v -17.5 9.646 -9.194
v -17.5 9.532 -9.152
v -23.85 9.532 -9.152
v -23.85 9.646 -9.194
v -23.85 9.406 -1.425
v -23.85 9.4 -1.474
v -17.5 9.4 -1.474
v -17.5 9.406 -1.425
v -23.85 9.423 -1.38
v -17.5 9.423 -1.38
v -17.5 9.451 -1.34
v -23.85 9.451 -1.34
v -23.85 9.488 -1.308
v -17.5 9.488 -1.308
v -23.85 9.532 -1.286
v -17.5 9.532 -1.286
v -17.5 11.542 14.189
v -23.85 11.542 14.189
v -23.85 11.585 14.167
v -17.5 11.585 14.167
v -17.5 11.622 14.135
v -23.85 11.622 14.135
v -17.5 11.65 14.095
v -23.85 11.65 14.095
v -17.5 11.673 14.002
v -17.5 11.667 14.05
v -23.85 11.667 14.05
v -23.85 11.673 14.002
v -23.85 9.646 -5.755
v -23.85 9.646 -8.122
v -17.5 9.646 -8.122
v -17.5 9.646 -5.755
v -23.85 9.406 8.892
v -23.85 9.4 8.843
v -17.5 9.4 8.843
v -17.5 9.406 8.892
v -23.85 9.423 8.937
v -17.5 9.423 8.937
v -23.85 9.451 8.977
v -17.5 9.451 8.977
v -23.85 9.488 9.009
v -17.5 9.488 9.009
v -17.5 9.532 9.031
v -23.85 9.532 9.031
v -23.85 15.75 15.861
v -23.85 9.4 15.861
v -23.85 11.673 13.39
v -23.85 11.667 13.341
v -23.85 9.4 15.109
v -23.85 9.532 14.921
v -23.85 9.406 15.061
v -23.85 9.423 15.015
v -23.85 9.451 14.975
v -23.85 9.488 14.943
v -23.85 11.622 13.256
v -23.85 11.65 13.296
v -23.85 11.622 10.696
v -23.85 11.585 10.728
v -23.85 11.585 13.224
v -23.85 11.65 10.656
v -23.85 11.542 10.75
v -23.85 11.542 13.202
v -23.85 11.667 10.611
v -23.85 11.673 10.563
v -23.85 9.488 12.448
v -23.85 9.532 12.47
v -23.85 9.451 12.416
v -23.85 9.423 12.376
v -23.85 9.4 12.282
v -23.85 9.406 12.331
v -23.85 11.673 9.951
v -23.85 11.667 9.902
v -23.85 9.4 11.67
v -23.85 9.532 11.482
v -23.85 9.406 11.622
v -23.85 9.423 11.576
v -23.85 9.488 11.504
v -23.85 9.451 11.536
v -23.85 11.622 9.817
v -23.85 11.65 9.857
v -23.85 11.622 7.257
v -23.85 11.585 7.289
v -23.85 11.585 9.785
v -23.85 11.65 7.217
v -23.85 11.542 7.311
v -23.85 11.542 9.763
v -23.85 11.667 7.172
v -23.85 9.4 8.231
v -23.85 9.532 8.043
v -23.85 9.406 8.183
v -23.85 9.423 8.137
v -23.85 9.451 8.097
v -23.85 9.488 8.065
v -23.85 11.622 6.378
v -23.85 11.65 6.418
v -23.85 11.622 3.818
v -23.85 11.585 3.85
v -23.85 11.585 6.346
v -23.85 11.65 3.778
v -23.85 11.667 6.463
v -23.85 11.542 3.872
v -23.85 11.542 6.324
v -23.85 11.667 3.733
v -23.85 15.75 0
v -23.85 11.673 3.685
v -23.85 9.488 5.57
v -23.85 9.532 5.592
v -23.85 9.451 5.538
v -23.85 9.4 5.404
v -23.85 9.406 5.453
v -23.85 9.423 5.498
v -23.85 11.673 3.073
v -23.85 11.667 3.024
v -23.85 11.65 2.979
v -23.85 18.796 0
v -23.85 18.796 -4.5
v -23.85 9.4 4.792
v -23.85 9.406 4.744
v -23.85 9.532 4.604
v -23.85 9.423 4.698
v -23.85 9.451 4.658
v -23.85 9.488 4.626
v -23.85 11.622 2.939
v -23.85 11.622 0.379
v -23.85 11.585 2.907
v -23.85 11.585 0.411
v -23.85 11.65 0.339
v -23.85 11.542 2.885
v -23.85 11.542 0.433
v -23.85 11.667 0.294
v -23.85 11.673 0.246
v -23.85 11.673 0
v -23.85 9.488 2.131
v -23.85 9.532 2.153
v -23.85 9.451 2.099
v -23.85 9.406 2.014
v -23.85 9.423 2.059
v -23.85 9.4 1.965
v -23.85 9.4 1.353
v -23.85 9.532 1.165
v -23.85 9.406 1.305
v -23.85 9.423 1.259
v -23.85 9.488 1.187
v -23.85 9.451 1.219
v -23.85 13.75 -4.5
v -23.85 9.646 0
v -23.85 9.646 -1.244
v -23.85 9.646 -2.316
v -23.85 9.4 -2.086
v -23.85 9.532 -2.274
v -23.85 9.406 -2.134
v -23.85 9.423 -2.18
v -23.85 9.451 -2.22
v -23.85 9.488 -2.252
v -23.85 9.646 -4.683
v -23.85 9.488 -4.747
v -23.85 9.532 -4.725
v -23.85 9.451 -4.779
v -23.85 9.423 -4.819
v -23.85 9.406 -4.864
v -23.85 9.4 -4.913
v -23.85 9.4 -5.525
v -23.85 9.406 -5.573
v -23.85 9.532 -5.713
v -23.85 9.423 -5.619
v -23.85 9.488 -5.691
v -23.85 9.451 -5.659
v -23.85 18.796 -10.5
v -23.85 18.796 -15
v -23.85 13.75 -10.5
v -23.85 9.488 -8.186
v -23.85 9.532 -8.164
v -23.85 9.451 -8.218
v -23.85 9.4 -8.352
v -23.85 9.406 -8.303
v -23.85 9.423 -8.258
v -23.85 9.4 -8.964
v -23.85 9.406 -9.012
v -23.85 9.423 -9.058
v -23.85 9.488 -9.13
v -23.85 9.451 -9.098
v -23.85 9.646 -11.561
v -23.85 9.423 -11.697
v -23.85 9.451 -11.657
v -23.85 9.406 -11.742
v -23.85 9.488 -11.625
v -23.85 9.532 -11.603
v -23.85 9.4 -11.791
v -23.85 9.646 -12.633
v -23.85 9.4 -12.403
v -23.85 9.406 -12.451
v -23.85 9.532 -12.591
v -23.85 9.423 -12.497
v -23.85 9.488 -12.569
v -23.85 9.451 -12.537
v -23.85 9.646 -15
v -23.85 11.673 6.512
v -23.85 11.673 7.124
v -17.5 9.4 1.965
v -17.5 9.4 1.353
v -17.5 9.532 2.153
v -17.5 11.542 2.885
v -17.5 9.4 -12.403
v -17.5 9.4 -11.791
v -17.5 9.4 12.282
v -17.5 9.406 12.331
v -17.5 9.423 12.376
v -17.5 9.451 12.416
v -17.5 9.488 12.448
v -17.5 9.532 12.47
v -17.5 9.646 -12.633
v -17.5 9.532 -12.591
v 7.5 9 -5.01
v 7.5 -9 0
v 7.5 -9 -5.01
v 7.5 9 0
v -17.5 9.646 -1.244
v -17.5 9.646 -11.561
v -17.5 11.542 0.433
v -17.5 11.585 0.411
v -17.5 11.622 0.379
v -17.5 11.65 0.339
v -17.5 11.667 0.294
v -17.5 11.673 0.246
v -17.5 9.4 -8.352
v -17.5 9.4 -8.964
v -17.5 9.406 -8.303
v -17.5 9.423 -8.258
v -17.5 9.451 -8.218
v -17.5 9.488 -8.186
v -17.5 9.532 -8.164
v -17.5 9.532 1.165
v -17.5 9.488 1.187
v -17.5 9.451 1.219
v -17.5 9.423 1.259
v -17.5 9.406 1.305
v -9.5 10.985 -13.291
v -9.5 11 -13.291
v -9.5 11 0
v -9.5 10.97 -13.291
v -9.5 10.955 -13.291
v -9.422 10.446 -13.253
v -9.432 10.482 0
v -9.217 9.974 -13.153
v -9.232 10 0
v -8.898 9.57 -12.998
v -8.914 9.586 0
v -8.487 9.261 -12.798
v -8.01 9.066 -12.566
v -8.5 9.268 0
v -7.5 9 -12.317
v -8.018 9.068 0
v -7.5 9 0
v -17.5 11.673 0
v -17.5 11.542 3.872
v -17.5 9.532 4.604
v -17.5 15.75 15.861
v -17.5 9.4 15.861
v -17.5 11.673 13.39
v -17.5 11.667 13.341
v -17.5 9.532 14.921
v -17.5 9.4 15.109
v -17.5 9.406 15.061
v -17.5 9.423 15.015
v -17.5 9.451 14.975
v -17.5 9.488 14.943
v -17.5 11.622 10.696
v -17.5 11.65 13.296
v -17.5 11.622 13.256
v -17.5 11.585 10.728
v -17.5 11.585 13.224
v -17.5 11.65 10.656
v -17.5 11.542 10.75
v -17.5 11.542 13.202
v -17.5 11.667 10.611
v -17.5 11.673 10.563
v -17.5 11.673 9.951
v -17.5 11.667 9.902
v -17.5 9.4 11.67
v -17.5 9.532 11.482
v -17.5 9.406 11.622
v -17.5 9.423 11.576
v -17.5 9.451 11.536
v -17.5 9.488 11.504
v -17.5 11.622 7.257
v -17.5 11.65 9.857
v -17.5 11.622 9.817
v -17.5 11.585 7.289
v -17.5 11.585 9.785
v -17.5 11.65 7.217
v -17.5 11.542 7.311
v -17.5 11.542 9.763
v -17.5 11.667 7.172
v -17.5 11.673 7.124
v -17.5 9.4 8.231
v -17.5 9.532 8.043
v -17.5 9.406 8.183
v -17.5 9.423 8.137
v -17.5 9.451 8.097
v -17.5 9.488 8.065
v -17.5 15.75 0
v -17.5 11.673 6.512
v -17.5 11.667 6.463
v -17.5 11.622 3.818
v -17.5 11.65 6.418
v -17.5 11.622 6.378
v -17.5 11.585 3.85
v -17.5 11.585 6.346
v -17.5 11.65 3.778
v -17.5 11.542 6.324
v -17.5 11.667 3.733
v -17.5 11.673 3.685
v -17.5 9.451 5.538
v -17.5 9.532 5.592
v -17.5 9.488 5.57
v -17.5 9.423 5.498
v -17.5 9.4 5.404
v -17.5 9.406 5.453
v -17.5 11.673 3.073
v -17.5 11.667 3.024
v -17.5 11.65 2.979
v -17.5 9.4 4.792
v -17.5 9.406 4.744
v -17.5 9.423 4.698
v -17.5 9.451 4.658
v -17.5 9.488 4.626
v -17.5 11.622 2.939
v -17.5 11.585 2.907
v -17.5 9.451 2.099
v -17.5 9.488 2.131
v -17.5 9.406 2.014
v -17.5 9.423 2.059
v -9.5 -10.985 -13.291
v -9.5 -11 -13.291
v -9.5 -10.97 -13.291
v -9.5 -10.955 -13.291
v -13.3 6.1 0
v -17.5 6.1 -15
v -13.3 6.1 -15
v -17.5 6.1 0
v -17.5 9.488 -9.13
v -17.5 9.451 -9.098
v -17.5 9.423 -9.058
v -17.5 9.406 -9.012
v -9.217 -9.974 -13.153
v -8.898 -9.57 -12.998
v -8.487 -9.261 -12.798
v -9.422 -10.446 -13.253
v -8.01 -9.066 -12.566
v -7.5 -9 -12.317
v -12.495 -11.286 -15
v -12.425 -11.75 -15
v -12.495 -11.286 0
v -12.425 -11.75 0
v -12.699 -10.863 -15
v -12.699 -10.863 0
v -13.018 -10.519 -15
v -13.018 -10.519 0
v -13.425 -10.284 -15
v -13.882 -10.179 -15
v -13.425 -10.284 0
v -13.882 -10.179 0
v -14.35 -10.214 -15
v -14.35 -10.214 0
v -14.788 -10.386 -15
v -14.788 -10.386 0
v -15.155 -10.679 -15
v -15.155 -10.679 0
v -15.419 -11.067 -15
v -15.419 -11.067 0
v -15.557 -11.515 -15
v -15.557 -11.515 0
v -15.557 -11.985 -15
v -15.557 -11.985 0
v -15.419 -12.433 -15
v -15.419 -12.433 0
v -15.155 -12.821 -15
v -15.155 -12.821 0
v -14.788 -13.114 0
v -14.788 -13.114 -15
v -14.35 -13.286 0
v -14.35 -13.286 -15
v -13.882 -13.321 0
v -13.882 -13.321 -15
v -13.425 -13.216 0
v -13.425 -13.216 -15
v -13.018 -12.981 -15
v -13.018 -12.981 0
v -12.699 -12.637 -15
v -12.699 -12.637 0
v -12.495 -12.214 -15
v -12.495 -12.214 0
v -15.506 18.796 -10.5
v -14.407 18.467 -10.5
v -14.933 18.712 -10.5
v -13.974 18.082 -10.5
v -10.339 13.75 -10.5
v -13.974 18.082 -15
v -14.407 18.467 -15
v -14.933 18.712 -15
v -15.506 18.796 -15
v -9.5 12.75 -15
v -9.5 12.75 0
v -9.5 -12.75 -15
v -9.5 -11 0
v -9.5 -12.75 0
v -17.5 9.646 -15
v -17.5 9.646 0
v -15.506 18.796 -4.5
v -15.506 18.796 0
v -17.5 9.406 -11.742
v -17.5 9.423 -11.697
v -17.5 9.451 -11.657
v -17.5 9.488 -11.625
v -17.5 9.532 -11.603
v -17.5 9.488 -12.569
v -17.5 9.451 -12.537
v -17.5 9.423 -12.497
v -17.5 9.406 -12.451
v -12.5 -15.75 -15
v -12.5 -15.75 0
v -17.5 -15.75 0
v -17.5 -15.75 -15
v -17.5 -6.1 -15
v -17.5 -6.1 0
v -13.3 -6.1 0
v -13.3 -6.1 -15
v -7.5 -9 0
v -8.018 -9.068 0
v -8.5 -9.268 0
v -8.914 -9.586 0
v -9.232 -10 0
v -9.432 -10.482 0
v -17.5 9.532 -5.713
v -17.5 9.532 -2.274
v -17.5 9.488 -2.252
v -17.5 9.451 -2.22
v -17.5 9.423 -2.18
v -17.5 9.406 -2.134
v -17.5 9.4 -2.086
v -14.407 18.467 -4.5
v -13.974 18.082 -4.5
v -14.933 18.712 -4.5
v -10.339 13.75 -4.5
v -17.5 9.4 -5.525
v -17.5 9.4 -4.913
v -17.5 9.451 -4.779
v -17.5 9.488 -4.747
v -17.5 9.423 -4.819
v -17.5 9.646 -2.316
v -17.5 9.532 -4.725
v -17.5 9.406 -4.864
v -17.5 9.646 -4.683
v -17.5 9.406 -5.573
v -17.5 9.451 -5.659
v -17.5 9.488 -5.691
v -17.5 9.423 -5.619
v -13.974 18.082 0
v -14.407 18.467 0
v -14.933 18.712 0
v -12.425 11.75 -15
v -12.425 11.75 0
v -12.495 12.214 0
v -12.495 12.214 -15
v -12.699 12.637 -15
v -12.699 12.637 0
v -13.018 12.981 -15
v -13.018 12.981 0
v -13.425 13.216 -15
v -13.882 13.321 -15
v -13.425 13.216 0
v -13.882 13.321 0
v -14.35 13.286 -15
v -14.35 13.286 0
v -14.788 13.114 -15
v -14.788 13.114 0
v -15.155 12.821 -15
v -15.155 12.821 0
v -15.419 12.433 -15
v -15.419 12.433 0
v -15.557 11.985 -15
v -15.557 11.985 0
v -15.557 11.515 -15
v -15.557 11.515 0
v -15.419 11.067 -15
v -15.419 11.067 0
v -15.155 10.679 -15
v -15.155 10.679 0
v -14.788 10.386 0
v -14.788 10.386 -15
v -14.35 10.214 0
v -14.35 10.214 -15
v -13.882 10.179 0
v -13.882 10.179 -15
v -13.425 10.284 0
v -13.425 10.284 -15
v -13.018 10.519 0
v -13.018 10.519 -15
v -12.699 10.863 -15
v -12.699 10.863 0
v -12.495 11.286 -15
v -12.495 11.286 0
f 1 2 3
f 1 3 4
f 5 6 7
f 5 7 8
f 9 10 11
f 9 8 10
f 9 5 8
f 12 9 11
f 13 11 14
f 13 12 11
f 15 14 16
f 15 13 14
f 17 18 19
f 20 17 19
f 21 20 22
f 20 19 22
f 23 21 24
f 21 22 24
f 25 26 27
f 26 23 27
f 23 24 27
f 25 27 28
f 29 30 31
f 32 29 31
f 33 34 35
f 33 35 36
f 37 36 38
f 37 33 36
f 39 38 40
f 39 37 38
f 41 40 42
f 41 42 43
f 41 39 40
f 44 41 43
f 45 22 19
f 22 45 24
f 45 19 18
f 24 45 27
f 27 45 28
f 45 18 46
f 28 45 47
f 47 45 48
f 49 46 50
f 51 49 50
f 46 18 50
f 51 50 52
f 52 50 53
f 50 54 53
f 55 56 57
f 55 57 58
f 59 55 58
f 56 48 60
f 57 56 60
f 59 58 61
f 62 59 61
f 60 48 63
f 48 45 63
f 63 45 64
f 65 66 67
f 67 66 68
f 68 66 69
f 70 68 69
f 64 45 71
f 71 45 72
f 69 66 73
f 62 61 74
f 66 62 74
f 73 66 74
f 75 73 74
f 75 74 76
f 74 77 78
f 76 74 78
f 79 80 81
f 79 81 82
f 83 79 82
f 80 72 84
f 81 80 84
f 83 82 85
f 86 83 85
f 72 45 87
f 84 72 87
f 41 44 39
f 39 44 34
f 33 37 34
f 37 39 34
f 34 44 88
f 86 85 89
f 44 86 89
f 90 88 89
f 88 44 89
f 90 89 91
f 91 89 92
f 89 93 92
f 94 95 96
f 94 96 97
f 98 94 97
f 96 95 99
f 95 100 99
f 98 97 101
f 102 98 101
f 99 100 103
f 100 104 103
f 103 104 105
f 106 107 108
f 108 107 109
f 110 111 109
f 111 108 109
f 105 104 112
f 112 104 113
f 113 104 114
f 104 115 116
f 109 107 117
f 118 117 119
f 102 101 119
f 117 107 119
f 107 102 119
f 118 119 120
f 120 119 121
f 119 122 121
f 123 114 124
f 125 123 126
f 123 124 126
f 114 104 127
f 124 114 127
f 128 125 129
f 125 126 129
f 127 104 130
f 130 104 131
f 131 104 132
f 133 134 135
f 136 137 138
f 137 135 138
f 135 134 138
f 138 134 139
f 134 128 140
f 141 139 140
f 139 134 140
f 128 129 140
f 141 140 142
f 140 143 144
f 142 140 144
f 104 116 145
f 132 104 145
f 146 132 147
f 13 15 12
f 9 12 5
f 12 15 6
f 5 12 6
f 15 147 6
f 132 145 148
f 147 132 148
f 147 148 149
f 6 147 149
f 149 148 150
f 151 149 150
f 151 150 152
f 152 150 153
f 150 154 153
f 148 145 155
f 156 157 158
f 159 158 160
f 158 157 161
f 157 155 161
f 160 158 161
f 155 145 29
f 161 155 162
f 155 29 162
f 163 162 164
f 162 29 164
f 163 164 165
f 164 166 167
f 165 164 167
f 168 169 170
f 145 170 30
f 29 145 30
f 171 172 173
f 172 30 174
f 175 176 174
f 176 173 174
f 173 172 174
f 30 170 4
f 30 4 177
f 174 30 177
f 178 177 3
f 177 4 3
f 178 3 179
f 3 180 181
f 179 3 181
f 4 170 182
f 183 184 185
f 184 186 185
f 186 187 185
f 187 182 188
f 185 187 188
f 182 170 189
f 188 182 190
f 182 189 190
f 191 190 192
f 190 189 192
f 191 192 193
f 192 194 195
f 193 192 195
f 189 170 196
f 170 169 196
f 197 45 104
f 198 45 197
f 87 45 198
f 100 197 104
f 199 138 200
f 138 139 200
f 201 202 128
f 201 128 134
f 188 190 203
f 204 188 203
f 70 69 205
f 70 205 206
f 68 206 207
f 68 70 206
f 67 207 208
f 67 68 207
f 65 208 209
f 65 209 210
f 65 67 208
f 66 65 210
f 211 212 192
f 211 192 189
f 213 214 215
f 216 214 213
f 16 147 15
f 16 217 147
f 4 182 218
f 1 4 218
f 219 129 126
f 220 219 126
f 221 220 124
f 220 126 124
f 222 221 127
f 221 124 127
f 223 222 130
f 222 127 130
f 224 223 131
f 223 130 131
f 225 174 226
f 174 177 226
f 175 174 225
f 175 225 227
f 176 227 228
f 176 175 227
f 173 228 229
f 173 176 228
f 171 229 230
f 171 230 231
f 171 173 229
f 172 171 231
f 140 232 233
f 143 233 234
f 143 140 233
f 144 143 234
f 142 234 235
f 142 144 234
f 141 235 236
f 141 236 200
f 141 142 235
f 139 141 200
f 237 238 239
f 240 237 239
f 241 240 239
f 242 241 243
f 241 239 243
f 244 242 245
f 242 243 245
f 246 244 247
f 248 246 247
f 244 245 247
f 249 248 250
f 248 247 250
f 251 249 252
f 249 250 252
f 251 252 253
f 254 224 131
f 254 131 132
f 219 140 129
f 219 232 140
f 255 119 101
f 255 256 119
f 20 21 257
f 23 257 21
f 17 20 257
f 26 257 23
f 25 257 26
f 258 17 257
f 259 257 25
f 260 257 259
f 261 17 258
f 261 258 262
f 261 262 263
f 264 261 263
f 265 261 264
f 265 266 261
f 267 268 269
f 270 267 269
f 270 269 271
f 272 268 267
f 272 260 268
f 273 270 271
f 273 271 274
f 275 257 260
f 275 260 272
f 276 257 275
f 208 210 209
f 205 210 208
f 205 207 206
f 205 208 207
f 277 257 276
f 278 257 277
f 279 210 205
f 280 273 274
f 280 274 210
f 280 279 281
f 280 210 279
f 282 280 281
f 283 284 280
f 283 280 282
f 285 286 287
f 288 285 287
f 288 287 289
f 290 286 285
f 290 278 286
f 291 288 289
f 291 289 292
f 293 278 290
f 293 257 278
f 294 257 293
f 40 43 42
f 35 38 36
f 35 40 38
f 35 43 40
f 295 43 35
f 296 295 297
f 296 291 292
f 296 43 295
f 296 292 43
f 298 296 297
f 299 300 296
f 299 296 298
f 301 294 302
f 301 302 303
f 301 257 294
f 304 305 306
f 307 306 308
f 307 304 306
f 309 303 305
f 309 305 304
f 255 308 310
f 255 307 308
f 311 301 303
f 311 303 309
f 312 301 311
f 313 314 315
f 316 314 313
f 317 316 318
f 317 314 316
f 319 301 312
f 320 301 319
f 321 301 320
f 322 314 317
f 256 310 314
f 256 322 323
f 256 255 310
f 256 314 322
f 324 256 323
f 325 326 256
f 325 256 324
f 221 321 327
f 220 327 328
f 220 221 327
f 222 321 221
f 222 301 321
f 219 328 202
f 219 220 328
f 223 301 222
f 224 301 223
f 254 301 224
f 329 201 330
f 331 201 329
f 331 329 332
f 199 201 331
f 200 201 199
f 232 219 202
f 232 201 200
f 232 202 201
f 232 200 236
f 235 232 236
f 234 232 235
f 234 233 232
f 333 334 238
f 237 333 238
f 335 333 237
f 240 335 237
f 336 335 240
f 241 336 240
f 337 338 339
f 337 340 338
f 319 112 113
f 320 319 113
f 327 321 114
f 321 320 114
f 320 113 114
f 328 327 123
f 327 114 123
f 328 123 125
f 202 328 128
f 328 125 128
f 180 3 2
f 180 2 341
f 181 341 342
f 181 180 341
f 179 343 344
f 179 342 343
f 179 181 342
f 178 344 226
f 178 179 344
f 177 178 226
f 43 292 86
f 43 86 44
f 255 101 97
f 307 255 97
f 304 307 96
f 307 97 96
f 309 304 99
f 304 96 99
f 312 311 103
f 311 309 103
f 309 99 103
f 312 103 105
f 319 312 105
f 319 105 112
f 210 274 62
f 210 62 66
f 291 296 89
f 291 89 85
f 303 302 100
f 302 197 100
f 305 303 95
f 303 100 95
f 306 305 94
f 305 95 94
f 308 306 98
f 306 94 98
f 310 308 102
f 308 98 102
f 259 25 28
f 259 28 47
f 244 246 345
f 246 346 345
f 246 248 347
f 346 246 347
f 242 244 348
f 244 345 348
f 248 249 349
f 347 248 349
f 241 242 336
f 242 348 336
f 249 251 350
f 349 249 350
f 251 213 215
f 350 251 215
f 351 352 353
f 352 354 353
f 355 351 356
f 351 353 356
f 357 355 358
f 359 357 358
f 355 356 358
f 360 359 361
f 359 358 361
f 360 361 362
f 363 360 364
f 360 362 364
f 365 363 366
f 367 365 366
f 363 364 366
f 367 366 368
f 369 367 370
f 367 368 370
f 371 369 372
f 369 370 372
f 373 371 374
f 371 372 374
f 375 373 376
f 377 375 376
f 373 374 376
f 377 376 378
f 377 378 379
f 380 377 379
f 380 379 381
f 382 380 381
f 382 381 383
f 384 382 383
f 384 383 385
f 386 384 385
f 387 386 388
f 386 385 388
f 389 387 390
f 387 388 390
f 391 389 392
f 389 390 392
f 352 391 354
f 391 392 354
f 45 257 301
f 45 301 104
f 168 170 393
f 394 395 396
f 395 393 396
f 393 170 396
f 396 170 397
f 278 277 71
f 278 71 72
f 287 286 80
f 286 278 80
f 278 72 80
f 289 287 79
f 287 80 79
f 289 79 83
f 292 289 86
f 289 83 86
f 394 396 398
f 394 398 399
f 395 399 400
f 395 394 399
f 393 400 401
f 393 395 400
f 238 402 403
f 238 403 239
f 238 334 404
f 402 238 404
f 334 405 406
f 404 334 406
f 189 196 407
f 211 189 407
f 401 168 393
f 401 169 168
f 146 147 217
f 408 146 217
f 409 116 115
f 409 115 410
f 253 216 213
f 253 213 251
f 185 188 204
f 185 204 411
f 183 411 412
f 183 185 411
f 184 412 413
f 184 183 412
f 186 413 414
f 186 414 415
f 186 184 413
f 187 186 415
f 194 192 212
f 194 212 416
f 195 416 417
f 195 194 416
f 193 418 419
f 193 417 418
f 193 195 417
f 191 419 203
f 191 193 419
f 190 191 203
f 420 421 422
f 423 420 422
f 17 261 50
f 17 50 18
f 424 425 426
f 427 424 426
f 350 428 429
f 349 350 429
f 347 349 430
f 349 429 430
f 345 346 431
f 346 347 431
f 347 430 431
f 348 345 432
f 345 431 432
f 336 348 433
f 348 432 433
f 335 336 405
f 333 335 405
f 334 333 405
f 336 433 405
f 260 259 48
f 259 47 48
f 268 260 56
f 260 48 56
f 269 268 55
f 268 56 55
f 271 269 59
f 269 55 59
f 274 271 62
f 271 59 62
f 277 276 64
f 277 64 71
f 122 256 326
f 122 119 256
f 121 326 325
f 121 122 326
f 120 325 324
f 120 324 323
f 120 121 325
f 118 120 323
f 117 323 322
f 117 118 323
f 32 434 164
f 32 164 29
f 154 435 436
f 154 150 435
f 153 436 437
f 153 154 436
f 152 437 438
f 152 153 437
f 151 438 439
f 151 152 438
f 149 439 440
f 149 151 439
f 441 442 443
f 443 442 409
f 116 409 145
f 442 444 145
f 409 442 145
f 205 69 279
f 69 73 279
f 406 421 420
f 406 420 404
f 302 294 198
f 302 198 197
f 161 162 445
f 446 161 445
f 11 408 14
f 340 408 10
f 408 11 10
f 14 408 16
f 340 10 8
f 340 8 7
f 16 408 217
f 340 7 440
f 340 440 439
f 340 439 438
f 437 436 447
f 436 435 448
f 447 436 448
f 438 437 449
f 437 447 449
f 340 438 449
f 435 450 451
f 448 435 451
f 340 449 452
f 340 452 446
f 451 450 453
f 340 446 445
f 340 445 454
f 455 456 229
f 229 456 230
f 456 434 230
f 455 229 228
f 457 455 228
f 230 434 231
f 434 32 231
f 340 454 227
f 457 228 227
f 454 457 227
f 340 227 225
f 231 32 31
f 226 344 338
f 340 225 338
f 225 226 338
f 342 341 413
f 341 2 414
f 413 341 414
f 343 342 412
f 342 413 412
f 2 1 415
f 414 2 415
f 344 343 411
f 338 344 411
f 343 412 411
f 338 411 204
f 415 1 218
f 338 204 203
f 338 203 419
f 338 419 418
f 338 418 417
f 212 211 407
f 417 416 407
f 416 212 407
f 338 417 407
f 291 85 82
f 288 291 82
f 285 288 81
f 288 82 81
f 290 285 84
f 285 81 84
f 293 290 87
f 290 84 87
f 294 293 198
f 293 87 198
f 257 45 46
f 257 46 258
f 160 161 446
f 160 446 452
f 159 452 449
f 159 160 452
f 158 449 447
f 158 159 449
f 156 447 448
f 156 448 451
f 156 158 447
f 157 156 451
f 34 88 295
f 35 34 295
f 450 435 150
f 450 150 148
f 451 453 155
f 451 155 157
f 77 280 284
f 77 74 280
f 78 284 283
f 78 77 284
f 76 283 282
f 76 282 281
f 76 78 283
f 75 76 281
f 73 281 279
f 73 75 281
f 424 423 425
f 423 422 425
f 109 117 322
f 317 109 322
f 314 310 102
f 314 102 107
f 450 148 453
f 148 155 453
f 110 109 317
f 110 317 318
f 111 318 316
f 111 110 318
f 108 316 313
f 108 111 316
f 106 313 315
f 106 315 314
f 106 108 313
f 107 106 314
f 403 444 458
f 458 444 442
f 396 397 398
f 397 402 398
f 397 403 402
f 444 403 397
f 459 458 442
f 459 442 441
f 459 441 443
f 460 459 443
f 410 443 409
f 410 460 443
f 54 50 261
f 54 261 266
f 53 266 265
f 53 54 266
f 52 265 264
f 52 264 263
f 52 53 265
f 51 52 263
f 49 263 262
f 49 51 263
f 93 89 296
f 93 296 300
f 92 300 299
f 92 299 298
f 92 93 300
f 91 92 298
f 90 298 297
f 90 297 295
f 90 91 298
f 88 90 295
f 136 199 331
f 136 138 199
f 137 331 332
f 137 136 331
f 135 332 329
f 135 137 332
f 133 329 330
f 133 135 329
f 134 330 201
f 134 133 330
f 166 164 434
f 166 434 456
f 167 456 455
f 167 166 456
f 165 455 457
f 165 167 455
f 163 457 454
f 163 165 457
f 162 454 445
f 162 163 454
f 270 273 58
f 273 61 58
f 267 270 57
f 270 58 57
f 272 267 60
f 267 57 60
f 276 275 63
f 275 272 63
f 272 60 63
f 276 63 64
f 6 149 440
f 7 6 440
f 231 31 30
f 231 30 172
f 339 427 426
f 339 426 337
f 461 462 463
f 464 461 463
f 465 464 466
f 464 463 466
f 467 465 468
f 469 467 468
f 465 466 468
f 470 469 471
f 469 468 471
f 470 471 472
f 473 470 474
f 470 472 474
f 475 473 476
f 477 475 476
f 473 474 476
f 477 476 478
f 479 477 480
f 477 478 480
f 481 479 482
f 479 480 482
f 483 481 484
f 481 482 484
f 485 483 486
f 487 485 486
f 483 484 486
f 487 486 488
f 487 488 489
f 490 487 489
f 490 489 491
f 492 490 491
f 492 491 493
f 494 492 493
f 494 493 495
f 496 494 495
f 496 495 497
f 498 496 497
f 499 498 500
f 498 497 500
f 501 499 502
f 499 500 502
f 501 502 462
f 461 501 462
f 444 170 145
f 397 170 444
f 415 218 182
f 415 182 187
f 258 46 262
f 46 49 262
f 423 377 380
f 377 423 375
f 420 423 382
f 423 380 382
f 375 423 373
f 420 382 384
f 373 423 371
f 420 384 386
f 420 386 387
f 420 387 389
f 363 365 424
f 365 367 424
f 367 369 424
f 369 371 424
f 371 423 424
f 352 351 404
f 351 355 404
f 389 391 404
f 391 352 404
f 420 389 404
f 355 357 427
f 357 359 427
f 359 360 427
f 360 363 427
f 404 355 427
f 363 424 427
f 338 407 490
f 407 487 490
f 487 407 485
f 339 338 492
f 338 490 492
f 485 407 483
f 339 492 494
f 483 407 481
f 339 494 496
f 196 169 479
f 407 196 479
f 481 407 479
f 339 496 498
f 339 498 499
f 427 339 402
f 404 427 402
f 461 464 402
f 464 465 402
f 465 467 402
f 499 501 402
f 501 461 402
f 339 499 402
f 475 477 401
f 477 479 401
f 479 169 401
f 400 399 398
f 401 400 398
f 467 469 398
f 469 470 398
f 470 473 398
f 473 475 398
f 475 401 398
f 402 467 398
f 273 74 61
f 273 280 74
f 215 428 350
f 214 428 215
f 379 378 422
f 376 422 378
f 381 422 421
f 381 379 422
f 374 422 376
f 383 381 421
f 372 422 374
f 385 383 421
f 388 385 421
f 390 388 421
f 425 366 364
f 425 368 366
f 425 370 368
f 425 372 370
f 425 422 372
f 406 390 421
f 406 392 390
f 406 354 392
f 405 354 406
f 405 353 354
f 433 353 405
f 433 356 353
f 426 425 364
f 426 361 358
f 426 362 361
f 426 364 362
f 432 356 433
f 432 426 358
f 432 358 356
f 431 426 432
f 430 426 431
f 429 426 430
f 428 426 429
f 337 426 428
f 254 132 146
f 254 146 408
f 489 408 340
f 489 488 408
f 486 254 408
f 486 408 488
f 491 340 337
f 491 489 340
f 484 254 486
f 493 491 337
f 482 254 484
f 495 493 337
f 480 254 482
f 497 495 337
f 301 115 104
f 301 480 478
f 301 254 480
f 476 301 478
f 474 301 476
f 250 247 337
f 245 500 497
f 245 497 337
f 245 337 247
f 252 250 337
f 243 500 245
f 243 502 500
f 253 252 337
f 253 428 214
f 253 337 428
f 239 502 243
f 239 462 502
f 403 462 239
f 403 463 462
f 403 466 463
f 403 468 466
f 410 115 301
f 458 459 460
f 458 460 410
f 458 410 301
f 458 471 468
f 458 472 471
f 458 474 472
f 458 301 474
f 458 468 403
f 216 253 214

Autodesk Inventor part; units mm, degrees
ref_plane "YZ Plane" through (0, 0, 0) normal (1, 0, 0) x (0, 1, 0)
ref_plane "XZ Plane" through (0, 0, 0) normal (0, 1, 0) x (-1, 0, 0)
sketch "Sketch1" plane through (0, 0, 0) normal (0, 0, 1) x (1, 0, 0)
  line L0 (-7.5, -9) -> (7.5, -9)
  line L1 (7.5, -9) -> (7.5, 9)
  line L2 (7.5, 9) -> (-7.5, 9)
  line L3 (-9.5, -11) -> (-9.5, -12.75)
  line L4 (-12.5, -15.75) -> (-17.5, -15.75)
  arc A0 (-7.5, -9) -> (-9.5, -11) centre (-7.5, -11) ccw
  line L5 (-12.5, -15.75) -> (-9.5, -12.75)
  line L6 (-17.5, -15.75) -> (-17.5, -6.1)
  line L7 (-17.5, -6.1) -> (-13.3, -6.1)
  line L8 (-13.3, -6.1) -> (-13.3, 0)
  line L9 (2.7531, 0) -> (-2.7531, 0) construction
  line L10 (-9.5, 11) -> (-9.5, 12.75)
  line L11 (-12.5, 15.75) -> (-17.5, 15.75)
  arc A1 (-9.5, 11) -> (-7.5, 9) centre (-7.5, 11) ccw
  line L12 (-12.5, 15.75) -> (-9.5, 12.75)
  line L13 (-17.5, 15.75) -> (-17.5, 6.1)
  line L14 (-17.5, 6.1) -> (-13.3, 6.1)
  line L15 (-13.3, 6.1) -> (-13.3, 0)
  circle A2 centre (-14, -11.75) radius 1.575
  circle A3 centre (-14, 11.75) radius 1.575
  line L16 (-17.5, 15.75) -> (-23.85, 15.75)
  line L17 (-23.85, 15.75) -> (-23.85, 9.4)
  line L18 (-23.85, 9.4) -> (-17.5, 9.4)
  line L19 (-9.5, 11.875) -> (-9.5, -11.875)
  point P0 (0, 0)
  point P1 (0, 0)
  point P2 (7.5, 0)
  point P3 (0, -9)
  point P4 (-9.5, -15.75)
  point P5 (0, 0)
  point P6 (-9.5, 15.75)
  dimension "d1" = 18
  dimension "d3" = 8
  dimension "d4" = 2
  dimension "d5" = 3
  dimension "d6" = 3
  dimension "d7" = 9.65
  dimension "d8" = 4.2
  dimension "d9" = 6.1
  dimension "d10" = 7.5
  dimension "d11" = 3.875
  dimension "d12" = 3.15
  dimension "d13" = 3.5
  dimension "d14" = 4
  dimension "d15" = 6.35
  dimension "d16" = 6.35
extrude "Extrusion1" add sketch "Sketch1" against normal blind 15 contours L3 L5 L4 L6 L7 L8 L15 L14 L13 L11 L12 L10 L19
extrude "Extrusion2" add sketch "Sketch1" against normal blind 13.291 contours A0 L19 A1 L2 L1 L0
chamfer "Chamfer1" distance 17 distance2 8.281 1 edges at (7.5, 0, -13.291) measured on face at (-2.5, 3, -13.291)
extrude "Extrusion3" add sketch "Sketch1" along normal blind 15.861 and the other way blind 15 contours L13 L18 L17 L16
ref_plane "Work Plane1" through (-17.5, 9.4, 0) normal (1, 0, 0) x (0, 0, -1)
sketch "Sketch2" plane through (-17.5, 9.4, 0) normal (1, 0, 0) x (0, 0, -1)
  line L0 (0, 6.35) -> (0, 0) projected
  line L1 (15, 0) -> (0, 0) projected
  line L2 (15, 6.35) -> (15, 0) projected
  line L3 (0, 6.35) -> (15, 6.35) projected
  line L4 (-15.861, 6.35) -> (0, 6.35) projected
  line L5 (-15.861, 0) -> (-15.861, 6.35) projected
  line L6 (0, 0) -> (-15.861, 0) projected
  line L7 (0, -3.3) -> (0, 0) projected
  line L8 (15, -3.3) -> (0, -3.3) projected
  line L9 (15, 0) -> (15, -3.3) projected
  line L10 (0, -15.5) -> (15, -15.5) projected
  line L11 (15, -15.5) -> (15, -25.15) projected
  line L12 (15, -25.15) -> (0, -25.15) projected
  line L13 (0, -25.15) -> (0, -15.5) projected
  line L14 (-15.861, 0) -> (-14.969, 0)
  line L15 (-14.969, 0) -> (-14.1416, 2.2732)
  line L16 (-14.1416, 2.2732) -> (-13.2496, 2.2732)
  line L17 (-13.2496, 2.2732) -> (-12.4223, 0)
  line L18 (-15.861, 0) -> (15, 0) projected
  line L19 (-9.8106, 2.2732) -> (-8.9833, 0)
  line L20 (-10.7026, 2.2732) -> (-9.8106, 2.2732)
  line L21 (-11.53, 0) -> (-10.7026, 2.2732)
  line L22 (-12.422, 0) -> (-11.53, 0)
  line L23 (-6.3716, 2.2732) -> (-5.5443, 0)
  line L24 (-7.2636, 2.2732) -> (-6.3716, 2.2732)
  line L25 (-8.091, 0) -> (-7.2636, 2.2732)
  line L26 (-8.983, 0) -> (-8.091, 0)
  line L27 (-2.9326, 2.2732) -> (-2.1053, 0)
  line L28 (-3.8246, 2.2732) -> (-2.9326, 2.2732)
  line L29 (-4.652, 0) -> (-3.8246, 2.2732)
  line L30 (-5.544, 0) -> (-4.652, 0)
  line L31 (0.5064, 2.2732) -> (1.3337, 0)
  line L32 (-0.3856, 2.2732) -> (0.5064, 2.2732)
  line L33 (-1.213, 0) -> (-0.3856, 2.2732)
  line L34 (-2.105, 0) -> (-1.213, 0)
  line L35 (3.9454, 2.2732) -> (4.7727, 0)
  line L36 (3.0534, 2.2732) -> (3.9454, 2.2732)
  line L37 (2.226, 0) -> (3.0534, 2.2732)
  line L38 (1.334, 0) -> (2.226, 0)
  line L39 (7.3844, 2.2732) -> (8.2117, 0)
  line L40 (6.4924, 2.2732) -> (7.3844, 2.2732)
  line L41 (5.665, 0) -> (6.4924, 2.2732)
  line L42 (4.773, 0) -> (5.665, 0)
  line L43 (10.8234, 2.2732) -> (11.6507, 0)
  line L44 (9.9314, 2.2732) -> (10.8234, 2.2732)
  line L45 (9.104, 0) -> (9.9314, 2.2732)
  line L46 (8.212, 0) -> (9.104, 0)
  line L47 (14.2624, 2.2732) -> (15.0897, 0)
  line L48 (13.3704, 2.2732) -> (14.2624, 2.2732)
  line L49 (12.543, 0) -> (13.3704, 2.2732)
  line L50 (11.651, 0) -> (12.543, 0)
  point P0 (0, -9.4)
  point P1 (15, 0.2465)
  point P2 (11.6507, 0)
  point P3 (8.2117, 0)
  point P4 (4.7727, 0)
  point P5 (1.3337, 0)
  point P6 (-2.1053, 0)
  point P7 (-5.5443, 0)
  point P8 (-8.9833, 0)
  point P9 (-12.4223, 0)
  dimension "d29" = 0.892
  dimension "d30" = 110
  dimension "d31" = 110
  dimension "d32" = 0.892
  dimension "d33" = 2.2732
  dimension "d36" = 3.439
extrude "Extrusion4" cut sketch "Sketch2" against normal up to surface (6.35 mm away) contours L32 L31 L1 L0 | L0 L6 L33 L32 | L2 L1 L49 L48 L47 | L15 L16 L17 L6 | L37 L36 L35 L1 | L6 L29 L28 L27 | L1 L45 L44 L43 | L21 L20 L19 L6 | L41 L40 L39 L1 | L6 L25 L24 L23
fillet "Fillet1" radius 0.2 35 edges at (-20.675, 11.6732, 14.1416) (-20.675, 11.6732, 13.2496) (-20.675, 9.4, 14.969) (-20.675, 9.4, 12.4223) (-20.675, 9.4, 11.53) (-20.675, 11.6732, 10.7026) (-20.675, 11.6732, 9.8106) (-20.675, 9.4, 8.9833) (-20.675, 9.4, 8.091) (-20.675, 11.6732, 7.2636) (-20.675, 11.6732, 6.3716) (-20.675, 9.4, 5.5443) (-20.675, 9.4, 4.652) (-20.675, 11.6732, 3.8246) (-20.675, 11.6732, 2.9326) (-20.675, 9.4, 2.1053) (-20.675, 9.4, 1.213) (-20.675, 11.6732, 0.3856) (-20.675, 11.6732, -0.5064) (-20.675, 9.4, -1.3337) (-20.675, 9.4, -2.226) (-20.675, 11.6732, -3.0534) (-20.675, 11.6732, -3.9454) (-20.675, 9.4, -4.7727) (-20.675, 9.4, -5.665) (-20.675, 11.6732, -6.4924) (-20.675, 11.6732, -7.3844) (-20.675, 9.4, -8.2117) (-20.675, 9.4, -9.104) (-20.675, 11.6732, -9.9314) (-20.675, 11.6732, -10.8234) (-20.675, 9.4, -11.6507) (-20.675, 9.4, -12.543) (-20.675, 11.6732, -13.3704) (-20.675, 11.6732, -14.2624)
sketch "Sketch3" plane through (0, 0, -15) normal (0, 0, -1) x (-1, 0, 0)
  line L0 (23.85, 9.6465) -> (17.5, 9.6465) projected
  line L1 (17.5, 9.6465) -> (17.5, 6.1) projected
  line L2 (17.5, 6.1) -> (13.3, 6.1) projected
  line L3 (13.3, 6.1) -> (13.3, -6.1) projected
  line L4 (13.3, -6.1) -> (17.5, -6.1) projected
  line L5 (17.5, -6.1) -> (17.5, -15.75) projected
  line L6 (17.5, -15.75) -> (12.5, -15.75) projected
  line L7 (12.5, -15.75) -> (9.5, -12.75) projected
  line L8 (9.5, -12.75) -> (9.5, 12.75) projected
  line L9 (9.5, 12.75) -> (12.5, 15.75) projected
  line L10 (12.5, 15.75) -> (23.85, 15.75) projected
  line L11 (23.85, 15.75) -> (23.85, 9.6465) projected
  circle A0 centre (14, 11.75) radius 1.575 projected
  circle A1 centre (14, -11.75) radius 1.575 projected
  line L12 (23.85, 9.6465) -> (23.85, 18.7965)
  line L13 (9.5, 12.75) -> (14.5737, 18.7965)
  line L14 (23.85, 18.7965) -> (14.5737, 18.7965)
  point P0 (0, 0)
  dimension "d44" = 9.15
  dimension "d71" = 140
extrude "Extrusion5" add sketch "Sketch3" against normal up to surface (15 mm away) contours L0 L1 L2 L3 L4 L5 L6 L7 L8 L9 L10 L11 | L10 L9 L13 L14 L12 | A0 | A1
sketch "Sketch5" plane through (-23.85, 15.75, 0) normal (0, 1, 0) x (1, 0, 0)
  line L0 (0, 0) -> (6.35, 0) projected
  line L1 (6.35, 0) -> (6.35, -15.861) projected
  line L2 (6.35, -15.861) -> (0, -15.861) projected
  line L3 (0, -15.861) -> (0, 0) projected
  line L4 (0, 0) -> (0, 15) projected
  line L5 (0, 15) -> (11.8327, 15) projected
  line L6 (11.8327, 0) -> (6.35, 0) projected
  line L7 (0, 15) -> (0, 10.5)
  line L8 (0, 10.5) -> (0, 4.5)
  line L9 (0, 10.5) -> (14.35, 10.5)
  line L10 (14.35, 13.291) -> (14.35, 0) projected
  line L11 (14.35, 10.5) -> (14.35, 4.5)
  line L12 (14.35, 4.5) -> (0, 4.5)
  line L13 (0, 10.5) -> (0, 4.5)
  line L14 (11.8327, 15) -> (11.8327, 0) projected
  point P0 (23.85, 0)
  dimension "d47" = 4.5
  dimension "d49" = 6
extrude "Extrusion6" cut sketch "Sketch5" along normal blind 10 and the other way blind 2 contours L4 L9 L14 L12 | L14 L9 L10 L12
fillet "Fillet2" radius 2 2 edges at (-14.5737, 18.7965, -2.25) (-14.5737, 18.7965, -12.75)
extrude "Extrusion7" cut sketch "Sketch1" against normal up to surface (15 mm away) contours A2 | A3
equation "\"d6\" = d5"
properties part number "GA_2"
